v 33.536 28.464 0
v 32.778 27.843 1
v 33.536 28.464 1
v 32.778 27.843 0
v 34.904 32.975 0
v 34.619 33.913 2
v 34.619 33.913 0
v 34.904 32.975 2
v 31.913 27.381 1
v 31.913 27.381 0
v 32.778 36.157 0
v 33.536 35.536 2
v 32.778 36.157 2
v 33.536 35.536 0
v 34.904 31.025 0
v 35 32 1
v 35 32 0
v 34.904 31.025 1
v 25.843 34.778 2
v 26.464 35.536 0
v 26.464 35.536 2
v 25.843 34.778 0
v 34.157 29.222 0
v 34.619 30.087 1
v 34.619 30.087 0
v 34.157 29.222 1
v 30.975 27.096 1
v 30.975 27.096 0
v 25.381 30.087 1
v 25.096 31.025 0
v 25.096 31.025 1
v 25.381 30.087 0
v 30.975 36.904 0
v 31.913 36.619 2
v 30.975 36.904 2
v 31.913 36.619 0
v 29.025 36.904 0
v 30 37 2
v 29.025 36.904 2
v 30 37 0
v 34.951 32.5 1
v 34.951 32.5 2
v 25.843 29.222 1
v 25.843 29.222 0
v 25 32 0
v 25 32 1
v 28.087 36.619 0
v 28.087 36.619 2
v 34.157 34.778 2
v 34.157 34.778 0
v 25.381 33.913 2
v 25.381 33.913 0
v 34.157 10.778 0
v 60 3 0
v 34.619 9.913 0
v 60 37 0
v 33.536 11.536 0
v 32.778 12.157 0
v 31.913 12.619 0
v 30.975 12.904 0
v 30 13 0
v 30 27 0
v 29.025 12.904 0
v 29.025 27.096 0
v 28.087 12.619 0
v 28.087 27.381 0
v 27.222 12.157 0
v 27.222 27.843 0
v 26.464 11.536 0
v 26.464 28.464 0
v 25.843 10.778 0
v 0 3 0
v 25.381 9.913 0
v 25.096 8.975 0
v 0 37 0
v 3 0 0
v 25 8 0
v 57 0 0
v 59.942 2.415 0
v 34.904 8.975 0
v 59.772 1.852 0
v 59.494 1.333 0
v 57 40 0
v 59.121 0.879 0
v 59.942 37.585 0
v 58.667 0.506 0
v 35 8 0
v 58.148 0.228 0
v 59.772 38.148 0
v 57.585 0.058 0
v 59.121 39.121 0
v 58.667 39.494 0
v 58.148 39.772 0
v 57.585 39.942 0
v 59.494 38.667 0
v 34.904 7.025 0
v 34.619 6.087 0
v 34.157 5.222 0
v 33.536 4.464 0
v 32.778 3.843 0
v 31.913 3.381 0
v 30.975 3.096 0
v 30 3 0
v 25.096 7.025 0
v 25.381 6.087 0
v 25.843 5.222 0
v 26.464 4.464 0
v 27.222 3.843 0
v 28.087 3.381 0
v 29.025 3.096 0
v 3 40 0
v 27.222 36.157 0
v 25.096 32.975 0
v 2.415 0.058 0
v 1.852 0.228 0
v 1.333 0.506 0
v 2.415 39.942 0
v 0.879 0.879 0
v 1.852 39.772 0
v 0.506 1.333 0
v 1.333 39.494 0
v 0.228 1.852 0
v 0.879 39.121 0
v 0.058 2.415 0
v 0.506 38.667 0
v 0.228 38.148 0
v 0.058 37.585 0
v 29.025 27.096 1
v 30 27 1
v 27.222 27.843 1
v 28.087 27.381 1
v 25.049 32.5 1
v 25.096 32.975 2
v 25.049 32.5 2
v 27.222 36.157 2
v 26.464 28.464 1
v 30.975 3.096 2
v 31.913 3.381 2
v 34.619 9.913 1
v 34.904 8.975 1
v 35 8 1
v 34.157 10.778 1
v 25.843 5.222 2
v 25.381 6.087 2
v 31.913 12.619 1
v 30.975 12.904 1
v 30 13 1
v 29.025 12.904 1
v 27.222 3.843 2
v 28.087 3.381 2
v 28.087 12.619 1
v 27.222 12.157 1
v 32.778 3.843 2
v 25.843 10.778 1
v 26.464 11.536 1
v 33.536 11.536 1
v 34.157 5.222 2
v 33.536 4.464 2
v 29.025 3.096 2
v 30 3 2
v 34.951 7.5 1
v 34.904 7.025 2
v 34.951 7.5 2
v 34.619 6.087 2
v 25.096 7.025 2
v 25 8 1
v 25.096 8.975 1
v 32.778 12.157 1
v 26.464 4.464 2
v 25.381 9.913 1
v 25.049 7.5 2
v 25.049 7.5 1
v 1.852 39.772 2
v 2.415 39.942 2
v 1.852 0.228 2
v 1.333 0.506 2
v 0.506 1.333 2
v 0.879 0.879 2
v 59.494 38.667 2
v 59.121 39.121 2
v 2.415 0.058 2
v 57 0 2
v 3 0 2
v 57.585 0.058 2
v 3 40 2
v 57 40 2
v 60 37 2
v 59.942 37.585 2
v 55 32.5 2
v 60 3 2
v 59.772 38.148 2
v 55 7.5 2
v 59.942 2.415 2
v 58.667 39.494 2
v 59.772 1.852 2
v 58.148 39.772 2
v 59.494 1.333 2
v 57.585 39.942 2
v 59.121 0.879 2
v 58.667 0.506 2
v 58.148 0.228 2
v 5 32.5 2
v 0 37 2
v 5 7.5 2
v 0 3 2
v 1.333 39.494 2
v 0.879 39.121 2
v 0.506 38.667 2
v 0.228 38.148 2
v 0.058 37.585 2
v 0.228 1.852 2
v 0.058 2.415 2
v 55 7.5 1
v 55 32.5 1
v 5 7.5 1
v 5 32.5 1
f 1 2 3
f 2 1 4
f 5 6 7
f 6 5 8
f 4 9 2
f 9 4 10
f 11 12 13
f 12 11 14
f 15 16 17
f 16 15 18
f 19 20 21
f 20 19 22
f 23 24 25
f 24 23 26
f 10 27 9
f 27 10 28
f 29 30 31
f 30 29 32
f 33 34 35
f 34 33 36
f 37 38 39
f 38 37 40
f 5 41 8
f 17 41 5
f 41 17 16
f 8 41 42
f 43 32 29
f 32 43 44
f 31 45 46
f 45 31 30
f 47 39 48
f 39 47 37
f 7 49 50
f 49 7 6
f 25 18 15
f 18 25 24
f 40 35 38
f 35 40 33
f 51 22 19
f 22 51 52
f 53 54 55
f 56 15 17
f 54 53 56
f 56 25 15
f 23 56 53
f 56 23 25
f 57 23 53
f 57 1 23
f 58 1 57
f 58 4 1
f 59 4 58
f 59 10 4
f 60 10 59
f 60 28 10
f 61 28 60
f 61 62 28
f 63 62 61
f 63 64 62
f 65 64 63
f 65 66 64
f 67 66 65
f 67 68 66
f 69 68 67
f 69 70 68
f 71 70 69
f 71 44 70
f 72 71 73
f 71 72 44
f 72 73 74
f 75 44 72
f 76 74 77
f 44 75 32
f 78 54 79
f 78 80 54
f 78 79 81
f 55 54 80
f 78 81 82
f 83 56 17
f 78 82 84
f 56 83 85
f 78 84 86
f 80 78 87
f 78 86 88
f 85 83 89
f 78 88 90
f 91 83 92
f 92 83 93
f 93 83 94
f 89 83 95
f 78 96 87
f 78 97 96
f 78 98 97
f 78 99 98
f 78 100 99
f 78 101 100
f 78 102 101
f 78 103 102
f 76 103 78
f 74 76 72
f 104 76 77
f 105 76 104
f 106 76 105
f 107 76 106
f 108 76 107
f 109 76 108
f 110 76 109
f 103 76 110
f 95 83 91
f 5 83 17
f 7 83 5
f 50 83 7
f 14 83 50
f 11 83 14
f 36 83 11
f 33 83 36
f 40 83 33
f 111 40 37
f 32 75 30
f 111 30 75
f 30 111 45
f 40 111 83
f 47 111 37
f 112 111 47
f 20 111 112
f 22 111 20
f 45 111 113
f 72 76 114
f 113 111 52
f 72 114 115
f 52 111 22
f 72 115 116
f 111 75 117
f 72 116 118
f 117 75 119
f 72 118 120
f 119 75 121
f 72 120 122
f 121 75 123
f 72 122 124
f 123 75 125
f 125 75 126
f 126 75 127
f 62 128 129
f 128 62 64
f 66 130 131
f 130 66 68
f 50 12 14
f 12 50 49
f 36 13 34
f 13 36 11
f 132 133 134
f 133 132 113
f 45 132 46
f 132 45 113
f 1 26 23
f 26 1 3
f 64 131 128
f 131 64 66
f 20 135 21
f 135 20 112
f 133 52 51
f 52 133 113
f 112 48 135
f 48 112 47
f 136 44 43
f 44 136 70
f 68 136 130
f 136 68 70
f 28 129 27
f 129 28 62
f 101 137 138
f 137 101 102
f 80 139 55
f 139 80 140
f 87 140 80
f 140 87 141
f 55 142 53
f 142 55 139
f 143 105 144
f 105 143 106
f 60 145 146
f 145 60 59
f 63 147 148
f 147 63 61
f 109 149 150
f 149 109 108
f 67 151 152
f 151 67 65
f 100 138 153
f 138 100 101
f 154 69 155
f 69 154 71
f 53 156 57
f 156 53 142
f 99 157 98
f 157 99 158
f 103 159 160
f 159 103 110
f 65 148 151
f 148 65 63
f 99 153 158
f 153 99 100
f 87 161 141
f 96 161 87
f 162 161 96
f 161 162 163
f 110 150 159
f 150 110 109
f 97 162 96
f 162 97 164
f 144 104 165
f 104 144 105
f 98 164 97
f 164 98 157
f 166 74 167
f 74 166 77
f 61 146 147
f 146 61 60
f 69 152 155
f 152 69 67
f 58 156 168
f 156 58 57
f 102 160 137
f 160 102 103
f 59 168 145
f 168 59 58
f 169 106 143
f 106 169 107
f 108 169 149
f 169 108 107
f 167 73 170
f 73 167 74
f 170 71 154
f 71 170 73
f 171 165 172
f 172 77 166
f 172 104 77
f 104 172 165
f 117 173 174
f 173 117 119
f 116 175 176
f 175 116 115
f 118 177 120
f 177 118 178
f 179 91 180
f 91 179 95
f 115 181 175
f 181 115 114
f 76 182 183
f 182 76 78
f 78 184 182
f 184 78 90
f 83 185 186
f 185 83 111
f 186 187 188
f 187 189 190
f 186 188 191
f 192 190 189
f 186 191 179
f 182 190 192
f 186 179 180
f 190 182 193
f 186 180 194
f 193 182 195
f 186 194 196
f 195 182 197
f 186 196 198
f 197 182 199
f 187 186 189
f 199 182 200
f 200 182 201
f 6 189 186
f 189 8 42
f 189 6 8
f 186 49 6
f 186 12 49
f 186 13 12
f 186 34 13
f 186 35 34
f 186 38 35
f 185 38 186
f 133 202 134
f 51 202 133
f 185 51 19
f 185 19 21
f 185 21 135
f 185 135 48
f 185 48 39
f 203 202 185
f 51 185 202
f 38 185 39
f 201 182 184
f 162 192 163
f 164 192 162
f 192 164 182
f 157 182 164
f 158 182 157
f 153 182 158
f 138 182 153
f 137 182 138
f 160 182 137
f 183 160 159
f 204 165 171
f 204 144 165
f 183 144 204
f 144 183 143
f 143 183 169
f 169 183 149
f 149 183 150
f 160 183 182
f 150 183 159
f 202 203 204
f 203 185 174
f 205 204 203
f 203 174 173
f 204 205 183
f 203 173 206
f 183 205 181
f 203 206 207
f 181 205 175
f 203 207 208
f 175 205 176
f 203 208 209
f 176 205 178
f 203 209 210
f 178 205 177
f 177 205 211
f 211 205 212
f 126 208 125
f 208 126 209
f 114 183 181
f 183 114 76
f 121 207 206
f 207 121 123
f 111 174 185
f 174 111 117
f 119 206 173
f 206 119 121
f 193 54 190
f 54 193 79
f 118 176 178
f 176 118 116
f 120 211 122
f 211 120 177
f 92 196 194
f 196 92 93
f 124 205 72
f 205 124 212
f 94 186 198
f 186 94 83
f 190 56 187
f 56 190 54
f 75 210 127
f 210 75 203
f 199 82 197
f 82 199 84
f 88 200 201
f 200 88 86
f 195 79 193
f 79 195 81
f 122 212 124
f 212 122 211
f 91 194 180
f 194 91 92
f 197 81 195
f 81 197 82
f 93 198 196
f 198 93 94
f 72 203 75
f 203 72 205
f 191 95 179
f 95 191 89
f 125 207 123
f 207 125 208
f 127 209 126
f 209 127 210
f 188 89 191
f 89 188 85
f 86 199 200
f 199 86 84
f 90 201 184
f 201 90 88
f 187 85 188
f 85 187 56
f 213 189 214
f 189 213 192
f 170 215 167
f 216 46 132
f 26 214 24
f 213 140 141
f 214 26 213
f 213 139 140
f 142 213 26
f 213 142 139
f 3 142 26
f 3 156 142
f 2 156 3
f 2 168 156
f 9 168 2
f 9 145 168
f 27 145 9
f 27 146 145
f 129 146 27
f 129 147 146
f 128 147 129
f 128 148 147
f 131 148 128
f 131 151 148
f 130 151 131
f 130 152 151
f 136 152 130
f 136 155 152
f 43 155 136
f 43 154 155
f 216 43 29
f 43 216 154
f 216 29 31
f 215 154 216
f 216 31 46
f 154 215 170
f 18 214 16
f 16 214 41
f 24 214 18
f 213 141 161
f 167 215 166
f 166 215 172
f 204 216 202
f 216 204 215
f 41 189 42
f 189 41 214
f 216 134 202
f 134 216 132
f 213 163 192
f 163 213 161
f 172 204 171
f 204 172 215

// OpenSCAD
// Project ID Tag Holder
// For labeling equipment, projects, or team resources

// Parameters
tag_width = 60;
tag_height = 40;
tag_thickness = 2;
slot_width = 50;
slot_height = 25;
corner_radius = 3;
mounting_type = "magnet"; // "magnet", "clip", or "hole"
magnet_diameter = 10;
magnet_depth = 3;

// Rounded rectangle module
module rounded_rectangle(width, height, radius) {
    hull() {
        translate([radius, radius, 0])
            cylinder(r = radius, h = tag_thickness, $fn = 32);
        translate([width - radius, radius, 0])
            cylinder(r = radius, h = tag_thickness, $fn = 32);
        translate([radius, height - radius, 0])
            cylinder(r = radius, h = tag_thickness, $fn = 32);
        translate([width - radius, height - radius, 0])
            cylinder(r = radius, h = tag_thickness, $fn = 32);
    }
}

// Main tag holder
module project_tag_holder() {
    difference() {
        // Base tag
        rounded_rectangle(tag_width, tag_height, corner_radius);
        
        // Slot for label
        translate([(tag_width - slot_width) / 2, 
                   (tag_height - slot_height) / 2, 
                   tag_thickness - 1]) {
            cube([slot_width, slot_height, 2]);
        }
        
        // Text area (debossed)
        translate([(tag_width - slot_width) / 2 + 2, 
                   (tag_height - slot_height) / 2 + 2, 
                   tag_thickness - 0.5]) {
            cube([slot_width - 4, slot_height - 4, 1]);
        }
        
        // Mounting based on type
        if (mounting_type == "magnet") {
            // Magnet recess
            translate([tag_width / 2, tag_height - magnet_diameter / 2 - 3, 0]) {
                cylinder(d = magnet_diameter, h = magnet_depth, $fn = 32);
            }
            translate([tag_width / 2, magnet_diameter / 2 + 3, 0]) {
                cylinder(d = magnet_diameter, h = magnet_depth, $fn = 32);
            }
        } else if (mounting_type == "hole") {
            // Mounting holes
            translate([tag_width / 2, tag_height - 5, -1]) {
                cylinder(d = 3, h = tag_thickness + 2, $fn = 32);
            }
        }
    }
    
    // Clip mount (if selected)
    if (mounting_type == "clip") {
        translate([tag_width / 2 - 8, tag_height, 0]) {
            difference() {
                cube([16, 8, tag_thickness]);
                translate([8, 8, tag_thickness / 2]) {
                    rotate([90, 0, 0]) {
                        cylinder(d = 4, h = 10, $fn = 32);
                    }
                }
            }
        }
    }
}

// Render the tag holder
project_tag_holder();
